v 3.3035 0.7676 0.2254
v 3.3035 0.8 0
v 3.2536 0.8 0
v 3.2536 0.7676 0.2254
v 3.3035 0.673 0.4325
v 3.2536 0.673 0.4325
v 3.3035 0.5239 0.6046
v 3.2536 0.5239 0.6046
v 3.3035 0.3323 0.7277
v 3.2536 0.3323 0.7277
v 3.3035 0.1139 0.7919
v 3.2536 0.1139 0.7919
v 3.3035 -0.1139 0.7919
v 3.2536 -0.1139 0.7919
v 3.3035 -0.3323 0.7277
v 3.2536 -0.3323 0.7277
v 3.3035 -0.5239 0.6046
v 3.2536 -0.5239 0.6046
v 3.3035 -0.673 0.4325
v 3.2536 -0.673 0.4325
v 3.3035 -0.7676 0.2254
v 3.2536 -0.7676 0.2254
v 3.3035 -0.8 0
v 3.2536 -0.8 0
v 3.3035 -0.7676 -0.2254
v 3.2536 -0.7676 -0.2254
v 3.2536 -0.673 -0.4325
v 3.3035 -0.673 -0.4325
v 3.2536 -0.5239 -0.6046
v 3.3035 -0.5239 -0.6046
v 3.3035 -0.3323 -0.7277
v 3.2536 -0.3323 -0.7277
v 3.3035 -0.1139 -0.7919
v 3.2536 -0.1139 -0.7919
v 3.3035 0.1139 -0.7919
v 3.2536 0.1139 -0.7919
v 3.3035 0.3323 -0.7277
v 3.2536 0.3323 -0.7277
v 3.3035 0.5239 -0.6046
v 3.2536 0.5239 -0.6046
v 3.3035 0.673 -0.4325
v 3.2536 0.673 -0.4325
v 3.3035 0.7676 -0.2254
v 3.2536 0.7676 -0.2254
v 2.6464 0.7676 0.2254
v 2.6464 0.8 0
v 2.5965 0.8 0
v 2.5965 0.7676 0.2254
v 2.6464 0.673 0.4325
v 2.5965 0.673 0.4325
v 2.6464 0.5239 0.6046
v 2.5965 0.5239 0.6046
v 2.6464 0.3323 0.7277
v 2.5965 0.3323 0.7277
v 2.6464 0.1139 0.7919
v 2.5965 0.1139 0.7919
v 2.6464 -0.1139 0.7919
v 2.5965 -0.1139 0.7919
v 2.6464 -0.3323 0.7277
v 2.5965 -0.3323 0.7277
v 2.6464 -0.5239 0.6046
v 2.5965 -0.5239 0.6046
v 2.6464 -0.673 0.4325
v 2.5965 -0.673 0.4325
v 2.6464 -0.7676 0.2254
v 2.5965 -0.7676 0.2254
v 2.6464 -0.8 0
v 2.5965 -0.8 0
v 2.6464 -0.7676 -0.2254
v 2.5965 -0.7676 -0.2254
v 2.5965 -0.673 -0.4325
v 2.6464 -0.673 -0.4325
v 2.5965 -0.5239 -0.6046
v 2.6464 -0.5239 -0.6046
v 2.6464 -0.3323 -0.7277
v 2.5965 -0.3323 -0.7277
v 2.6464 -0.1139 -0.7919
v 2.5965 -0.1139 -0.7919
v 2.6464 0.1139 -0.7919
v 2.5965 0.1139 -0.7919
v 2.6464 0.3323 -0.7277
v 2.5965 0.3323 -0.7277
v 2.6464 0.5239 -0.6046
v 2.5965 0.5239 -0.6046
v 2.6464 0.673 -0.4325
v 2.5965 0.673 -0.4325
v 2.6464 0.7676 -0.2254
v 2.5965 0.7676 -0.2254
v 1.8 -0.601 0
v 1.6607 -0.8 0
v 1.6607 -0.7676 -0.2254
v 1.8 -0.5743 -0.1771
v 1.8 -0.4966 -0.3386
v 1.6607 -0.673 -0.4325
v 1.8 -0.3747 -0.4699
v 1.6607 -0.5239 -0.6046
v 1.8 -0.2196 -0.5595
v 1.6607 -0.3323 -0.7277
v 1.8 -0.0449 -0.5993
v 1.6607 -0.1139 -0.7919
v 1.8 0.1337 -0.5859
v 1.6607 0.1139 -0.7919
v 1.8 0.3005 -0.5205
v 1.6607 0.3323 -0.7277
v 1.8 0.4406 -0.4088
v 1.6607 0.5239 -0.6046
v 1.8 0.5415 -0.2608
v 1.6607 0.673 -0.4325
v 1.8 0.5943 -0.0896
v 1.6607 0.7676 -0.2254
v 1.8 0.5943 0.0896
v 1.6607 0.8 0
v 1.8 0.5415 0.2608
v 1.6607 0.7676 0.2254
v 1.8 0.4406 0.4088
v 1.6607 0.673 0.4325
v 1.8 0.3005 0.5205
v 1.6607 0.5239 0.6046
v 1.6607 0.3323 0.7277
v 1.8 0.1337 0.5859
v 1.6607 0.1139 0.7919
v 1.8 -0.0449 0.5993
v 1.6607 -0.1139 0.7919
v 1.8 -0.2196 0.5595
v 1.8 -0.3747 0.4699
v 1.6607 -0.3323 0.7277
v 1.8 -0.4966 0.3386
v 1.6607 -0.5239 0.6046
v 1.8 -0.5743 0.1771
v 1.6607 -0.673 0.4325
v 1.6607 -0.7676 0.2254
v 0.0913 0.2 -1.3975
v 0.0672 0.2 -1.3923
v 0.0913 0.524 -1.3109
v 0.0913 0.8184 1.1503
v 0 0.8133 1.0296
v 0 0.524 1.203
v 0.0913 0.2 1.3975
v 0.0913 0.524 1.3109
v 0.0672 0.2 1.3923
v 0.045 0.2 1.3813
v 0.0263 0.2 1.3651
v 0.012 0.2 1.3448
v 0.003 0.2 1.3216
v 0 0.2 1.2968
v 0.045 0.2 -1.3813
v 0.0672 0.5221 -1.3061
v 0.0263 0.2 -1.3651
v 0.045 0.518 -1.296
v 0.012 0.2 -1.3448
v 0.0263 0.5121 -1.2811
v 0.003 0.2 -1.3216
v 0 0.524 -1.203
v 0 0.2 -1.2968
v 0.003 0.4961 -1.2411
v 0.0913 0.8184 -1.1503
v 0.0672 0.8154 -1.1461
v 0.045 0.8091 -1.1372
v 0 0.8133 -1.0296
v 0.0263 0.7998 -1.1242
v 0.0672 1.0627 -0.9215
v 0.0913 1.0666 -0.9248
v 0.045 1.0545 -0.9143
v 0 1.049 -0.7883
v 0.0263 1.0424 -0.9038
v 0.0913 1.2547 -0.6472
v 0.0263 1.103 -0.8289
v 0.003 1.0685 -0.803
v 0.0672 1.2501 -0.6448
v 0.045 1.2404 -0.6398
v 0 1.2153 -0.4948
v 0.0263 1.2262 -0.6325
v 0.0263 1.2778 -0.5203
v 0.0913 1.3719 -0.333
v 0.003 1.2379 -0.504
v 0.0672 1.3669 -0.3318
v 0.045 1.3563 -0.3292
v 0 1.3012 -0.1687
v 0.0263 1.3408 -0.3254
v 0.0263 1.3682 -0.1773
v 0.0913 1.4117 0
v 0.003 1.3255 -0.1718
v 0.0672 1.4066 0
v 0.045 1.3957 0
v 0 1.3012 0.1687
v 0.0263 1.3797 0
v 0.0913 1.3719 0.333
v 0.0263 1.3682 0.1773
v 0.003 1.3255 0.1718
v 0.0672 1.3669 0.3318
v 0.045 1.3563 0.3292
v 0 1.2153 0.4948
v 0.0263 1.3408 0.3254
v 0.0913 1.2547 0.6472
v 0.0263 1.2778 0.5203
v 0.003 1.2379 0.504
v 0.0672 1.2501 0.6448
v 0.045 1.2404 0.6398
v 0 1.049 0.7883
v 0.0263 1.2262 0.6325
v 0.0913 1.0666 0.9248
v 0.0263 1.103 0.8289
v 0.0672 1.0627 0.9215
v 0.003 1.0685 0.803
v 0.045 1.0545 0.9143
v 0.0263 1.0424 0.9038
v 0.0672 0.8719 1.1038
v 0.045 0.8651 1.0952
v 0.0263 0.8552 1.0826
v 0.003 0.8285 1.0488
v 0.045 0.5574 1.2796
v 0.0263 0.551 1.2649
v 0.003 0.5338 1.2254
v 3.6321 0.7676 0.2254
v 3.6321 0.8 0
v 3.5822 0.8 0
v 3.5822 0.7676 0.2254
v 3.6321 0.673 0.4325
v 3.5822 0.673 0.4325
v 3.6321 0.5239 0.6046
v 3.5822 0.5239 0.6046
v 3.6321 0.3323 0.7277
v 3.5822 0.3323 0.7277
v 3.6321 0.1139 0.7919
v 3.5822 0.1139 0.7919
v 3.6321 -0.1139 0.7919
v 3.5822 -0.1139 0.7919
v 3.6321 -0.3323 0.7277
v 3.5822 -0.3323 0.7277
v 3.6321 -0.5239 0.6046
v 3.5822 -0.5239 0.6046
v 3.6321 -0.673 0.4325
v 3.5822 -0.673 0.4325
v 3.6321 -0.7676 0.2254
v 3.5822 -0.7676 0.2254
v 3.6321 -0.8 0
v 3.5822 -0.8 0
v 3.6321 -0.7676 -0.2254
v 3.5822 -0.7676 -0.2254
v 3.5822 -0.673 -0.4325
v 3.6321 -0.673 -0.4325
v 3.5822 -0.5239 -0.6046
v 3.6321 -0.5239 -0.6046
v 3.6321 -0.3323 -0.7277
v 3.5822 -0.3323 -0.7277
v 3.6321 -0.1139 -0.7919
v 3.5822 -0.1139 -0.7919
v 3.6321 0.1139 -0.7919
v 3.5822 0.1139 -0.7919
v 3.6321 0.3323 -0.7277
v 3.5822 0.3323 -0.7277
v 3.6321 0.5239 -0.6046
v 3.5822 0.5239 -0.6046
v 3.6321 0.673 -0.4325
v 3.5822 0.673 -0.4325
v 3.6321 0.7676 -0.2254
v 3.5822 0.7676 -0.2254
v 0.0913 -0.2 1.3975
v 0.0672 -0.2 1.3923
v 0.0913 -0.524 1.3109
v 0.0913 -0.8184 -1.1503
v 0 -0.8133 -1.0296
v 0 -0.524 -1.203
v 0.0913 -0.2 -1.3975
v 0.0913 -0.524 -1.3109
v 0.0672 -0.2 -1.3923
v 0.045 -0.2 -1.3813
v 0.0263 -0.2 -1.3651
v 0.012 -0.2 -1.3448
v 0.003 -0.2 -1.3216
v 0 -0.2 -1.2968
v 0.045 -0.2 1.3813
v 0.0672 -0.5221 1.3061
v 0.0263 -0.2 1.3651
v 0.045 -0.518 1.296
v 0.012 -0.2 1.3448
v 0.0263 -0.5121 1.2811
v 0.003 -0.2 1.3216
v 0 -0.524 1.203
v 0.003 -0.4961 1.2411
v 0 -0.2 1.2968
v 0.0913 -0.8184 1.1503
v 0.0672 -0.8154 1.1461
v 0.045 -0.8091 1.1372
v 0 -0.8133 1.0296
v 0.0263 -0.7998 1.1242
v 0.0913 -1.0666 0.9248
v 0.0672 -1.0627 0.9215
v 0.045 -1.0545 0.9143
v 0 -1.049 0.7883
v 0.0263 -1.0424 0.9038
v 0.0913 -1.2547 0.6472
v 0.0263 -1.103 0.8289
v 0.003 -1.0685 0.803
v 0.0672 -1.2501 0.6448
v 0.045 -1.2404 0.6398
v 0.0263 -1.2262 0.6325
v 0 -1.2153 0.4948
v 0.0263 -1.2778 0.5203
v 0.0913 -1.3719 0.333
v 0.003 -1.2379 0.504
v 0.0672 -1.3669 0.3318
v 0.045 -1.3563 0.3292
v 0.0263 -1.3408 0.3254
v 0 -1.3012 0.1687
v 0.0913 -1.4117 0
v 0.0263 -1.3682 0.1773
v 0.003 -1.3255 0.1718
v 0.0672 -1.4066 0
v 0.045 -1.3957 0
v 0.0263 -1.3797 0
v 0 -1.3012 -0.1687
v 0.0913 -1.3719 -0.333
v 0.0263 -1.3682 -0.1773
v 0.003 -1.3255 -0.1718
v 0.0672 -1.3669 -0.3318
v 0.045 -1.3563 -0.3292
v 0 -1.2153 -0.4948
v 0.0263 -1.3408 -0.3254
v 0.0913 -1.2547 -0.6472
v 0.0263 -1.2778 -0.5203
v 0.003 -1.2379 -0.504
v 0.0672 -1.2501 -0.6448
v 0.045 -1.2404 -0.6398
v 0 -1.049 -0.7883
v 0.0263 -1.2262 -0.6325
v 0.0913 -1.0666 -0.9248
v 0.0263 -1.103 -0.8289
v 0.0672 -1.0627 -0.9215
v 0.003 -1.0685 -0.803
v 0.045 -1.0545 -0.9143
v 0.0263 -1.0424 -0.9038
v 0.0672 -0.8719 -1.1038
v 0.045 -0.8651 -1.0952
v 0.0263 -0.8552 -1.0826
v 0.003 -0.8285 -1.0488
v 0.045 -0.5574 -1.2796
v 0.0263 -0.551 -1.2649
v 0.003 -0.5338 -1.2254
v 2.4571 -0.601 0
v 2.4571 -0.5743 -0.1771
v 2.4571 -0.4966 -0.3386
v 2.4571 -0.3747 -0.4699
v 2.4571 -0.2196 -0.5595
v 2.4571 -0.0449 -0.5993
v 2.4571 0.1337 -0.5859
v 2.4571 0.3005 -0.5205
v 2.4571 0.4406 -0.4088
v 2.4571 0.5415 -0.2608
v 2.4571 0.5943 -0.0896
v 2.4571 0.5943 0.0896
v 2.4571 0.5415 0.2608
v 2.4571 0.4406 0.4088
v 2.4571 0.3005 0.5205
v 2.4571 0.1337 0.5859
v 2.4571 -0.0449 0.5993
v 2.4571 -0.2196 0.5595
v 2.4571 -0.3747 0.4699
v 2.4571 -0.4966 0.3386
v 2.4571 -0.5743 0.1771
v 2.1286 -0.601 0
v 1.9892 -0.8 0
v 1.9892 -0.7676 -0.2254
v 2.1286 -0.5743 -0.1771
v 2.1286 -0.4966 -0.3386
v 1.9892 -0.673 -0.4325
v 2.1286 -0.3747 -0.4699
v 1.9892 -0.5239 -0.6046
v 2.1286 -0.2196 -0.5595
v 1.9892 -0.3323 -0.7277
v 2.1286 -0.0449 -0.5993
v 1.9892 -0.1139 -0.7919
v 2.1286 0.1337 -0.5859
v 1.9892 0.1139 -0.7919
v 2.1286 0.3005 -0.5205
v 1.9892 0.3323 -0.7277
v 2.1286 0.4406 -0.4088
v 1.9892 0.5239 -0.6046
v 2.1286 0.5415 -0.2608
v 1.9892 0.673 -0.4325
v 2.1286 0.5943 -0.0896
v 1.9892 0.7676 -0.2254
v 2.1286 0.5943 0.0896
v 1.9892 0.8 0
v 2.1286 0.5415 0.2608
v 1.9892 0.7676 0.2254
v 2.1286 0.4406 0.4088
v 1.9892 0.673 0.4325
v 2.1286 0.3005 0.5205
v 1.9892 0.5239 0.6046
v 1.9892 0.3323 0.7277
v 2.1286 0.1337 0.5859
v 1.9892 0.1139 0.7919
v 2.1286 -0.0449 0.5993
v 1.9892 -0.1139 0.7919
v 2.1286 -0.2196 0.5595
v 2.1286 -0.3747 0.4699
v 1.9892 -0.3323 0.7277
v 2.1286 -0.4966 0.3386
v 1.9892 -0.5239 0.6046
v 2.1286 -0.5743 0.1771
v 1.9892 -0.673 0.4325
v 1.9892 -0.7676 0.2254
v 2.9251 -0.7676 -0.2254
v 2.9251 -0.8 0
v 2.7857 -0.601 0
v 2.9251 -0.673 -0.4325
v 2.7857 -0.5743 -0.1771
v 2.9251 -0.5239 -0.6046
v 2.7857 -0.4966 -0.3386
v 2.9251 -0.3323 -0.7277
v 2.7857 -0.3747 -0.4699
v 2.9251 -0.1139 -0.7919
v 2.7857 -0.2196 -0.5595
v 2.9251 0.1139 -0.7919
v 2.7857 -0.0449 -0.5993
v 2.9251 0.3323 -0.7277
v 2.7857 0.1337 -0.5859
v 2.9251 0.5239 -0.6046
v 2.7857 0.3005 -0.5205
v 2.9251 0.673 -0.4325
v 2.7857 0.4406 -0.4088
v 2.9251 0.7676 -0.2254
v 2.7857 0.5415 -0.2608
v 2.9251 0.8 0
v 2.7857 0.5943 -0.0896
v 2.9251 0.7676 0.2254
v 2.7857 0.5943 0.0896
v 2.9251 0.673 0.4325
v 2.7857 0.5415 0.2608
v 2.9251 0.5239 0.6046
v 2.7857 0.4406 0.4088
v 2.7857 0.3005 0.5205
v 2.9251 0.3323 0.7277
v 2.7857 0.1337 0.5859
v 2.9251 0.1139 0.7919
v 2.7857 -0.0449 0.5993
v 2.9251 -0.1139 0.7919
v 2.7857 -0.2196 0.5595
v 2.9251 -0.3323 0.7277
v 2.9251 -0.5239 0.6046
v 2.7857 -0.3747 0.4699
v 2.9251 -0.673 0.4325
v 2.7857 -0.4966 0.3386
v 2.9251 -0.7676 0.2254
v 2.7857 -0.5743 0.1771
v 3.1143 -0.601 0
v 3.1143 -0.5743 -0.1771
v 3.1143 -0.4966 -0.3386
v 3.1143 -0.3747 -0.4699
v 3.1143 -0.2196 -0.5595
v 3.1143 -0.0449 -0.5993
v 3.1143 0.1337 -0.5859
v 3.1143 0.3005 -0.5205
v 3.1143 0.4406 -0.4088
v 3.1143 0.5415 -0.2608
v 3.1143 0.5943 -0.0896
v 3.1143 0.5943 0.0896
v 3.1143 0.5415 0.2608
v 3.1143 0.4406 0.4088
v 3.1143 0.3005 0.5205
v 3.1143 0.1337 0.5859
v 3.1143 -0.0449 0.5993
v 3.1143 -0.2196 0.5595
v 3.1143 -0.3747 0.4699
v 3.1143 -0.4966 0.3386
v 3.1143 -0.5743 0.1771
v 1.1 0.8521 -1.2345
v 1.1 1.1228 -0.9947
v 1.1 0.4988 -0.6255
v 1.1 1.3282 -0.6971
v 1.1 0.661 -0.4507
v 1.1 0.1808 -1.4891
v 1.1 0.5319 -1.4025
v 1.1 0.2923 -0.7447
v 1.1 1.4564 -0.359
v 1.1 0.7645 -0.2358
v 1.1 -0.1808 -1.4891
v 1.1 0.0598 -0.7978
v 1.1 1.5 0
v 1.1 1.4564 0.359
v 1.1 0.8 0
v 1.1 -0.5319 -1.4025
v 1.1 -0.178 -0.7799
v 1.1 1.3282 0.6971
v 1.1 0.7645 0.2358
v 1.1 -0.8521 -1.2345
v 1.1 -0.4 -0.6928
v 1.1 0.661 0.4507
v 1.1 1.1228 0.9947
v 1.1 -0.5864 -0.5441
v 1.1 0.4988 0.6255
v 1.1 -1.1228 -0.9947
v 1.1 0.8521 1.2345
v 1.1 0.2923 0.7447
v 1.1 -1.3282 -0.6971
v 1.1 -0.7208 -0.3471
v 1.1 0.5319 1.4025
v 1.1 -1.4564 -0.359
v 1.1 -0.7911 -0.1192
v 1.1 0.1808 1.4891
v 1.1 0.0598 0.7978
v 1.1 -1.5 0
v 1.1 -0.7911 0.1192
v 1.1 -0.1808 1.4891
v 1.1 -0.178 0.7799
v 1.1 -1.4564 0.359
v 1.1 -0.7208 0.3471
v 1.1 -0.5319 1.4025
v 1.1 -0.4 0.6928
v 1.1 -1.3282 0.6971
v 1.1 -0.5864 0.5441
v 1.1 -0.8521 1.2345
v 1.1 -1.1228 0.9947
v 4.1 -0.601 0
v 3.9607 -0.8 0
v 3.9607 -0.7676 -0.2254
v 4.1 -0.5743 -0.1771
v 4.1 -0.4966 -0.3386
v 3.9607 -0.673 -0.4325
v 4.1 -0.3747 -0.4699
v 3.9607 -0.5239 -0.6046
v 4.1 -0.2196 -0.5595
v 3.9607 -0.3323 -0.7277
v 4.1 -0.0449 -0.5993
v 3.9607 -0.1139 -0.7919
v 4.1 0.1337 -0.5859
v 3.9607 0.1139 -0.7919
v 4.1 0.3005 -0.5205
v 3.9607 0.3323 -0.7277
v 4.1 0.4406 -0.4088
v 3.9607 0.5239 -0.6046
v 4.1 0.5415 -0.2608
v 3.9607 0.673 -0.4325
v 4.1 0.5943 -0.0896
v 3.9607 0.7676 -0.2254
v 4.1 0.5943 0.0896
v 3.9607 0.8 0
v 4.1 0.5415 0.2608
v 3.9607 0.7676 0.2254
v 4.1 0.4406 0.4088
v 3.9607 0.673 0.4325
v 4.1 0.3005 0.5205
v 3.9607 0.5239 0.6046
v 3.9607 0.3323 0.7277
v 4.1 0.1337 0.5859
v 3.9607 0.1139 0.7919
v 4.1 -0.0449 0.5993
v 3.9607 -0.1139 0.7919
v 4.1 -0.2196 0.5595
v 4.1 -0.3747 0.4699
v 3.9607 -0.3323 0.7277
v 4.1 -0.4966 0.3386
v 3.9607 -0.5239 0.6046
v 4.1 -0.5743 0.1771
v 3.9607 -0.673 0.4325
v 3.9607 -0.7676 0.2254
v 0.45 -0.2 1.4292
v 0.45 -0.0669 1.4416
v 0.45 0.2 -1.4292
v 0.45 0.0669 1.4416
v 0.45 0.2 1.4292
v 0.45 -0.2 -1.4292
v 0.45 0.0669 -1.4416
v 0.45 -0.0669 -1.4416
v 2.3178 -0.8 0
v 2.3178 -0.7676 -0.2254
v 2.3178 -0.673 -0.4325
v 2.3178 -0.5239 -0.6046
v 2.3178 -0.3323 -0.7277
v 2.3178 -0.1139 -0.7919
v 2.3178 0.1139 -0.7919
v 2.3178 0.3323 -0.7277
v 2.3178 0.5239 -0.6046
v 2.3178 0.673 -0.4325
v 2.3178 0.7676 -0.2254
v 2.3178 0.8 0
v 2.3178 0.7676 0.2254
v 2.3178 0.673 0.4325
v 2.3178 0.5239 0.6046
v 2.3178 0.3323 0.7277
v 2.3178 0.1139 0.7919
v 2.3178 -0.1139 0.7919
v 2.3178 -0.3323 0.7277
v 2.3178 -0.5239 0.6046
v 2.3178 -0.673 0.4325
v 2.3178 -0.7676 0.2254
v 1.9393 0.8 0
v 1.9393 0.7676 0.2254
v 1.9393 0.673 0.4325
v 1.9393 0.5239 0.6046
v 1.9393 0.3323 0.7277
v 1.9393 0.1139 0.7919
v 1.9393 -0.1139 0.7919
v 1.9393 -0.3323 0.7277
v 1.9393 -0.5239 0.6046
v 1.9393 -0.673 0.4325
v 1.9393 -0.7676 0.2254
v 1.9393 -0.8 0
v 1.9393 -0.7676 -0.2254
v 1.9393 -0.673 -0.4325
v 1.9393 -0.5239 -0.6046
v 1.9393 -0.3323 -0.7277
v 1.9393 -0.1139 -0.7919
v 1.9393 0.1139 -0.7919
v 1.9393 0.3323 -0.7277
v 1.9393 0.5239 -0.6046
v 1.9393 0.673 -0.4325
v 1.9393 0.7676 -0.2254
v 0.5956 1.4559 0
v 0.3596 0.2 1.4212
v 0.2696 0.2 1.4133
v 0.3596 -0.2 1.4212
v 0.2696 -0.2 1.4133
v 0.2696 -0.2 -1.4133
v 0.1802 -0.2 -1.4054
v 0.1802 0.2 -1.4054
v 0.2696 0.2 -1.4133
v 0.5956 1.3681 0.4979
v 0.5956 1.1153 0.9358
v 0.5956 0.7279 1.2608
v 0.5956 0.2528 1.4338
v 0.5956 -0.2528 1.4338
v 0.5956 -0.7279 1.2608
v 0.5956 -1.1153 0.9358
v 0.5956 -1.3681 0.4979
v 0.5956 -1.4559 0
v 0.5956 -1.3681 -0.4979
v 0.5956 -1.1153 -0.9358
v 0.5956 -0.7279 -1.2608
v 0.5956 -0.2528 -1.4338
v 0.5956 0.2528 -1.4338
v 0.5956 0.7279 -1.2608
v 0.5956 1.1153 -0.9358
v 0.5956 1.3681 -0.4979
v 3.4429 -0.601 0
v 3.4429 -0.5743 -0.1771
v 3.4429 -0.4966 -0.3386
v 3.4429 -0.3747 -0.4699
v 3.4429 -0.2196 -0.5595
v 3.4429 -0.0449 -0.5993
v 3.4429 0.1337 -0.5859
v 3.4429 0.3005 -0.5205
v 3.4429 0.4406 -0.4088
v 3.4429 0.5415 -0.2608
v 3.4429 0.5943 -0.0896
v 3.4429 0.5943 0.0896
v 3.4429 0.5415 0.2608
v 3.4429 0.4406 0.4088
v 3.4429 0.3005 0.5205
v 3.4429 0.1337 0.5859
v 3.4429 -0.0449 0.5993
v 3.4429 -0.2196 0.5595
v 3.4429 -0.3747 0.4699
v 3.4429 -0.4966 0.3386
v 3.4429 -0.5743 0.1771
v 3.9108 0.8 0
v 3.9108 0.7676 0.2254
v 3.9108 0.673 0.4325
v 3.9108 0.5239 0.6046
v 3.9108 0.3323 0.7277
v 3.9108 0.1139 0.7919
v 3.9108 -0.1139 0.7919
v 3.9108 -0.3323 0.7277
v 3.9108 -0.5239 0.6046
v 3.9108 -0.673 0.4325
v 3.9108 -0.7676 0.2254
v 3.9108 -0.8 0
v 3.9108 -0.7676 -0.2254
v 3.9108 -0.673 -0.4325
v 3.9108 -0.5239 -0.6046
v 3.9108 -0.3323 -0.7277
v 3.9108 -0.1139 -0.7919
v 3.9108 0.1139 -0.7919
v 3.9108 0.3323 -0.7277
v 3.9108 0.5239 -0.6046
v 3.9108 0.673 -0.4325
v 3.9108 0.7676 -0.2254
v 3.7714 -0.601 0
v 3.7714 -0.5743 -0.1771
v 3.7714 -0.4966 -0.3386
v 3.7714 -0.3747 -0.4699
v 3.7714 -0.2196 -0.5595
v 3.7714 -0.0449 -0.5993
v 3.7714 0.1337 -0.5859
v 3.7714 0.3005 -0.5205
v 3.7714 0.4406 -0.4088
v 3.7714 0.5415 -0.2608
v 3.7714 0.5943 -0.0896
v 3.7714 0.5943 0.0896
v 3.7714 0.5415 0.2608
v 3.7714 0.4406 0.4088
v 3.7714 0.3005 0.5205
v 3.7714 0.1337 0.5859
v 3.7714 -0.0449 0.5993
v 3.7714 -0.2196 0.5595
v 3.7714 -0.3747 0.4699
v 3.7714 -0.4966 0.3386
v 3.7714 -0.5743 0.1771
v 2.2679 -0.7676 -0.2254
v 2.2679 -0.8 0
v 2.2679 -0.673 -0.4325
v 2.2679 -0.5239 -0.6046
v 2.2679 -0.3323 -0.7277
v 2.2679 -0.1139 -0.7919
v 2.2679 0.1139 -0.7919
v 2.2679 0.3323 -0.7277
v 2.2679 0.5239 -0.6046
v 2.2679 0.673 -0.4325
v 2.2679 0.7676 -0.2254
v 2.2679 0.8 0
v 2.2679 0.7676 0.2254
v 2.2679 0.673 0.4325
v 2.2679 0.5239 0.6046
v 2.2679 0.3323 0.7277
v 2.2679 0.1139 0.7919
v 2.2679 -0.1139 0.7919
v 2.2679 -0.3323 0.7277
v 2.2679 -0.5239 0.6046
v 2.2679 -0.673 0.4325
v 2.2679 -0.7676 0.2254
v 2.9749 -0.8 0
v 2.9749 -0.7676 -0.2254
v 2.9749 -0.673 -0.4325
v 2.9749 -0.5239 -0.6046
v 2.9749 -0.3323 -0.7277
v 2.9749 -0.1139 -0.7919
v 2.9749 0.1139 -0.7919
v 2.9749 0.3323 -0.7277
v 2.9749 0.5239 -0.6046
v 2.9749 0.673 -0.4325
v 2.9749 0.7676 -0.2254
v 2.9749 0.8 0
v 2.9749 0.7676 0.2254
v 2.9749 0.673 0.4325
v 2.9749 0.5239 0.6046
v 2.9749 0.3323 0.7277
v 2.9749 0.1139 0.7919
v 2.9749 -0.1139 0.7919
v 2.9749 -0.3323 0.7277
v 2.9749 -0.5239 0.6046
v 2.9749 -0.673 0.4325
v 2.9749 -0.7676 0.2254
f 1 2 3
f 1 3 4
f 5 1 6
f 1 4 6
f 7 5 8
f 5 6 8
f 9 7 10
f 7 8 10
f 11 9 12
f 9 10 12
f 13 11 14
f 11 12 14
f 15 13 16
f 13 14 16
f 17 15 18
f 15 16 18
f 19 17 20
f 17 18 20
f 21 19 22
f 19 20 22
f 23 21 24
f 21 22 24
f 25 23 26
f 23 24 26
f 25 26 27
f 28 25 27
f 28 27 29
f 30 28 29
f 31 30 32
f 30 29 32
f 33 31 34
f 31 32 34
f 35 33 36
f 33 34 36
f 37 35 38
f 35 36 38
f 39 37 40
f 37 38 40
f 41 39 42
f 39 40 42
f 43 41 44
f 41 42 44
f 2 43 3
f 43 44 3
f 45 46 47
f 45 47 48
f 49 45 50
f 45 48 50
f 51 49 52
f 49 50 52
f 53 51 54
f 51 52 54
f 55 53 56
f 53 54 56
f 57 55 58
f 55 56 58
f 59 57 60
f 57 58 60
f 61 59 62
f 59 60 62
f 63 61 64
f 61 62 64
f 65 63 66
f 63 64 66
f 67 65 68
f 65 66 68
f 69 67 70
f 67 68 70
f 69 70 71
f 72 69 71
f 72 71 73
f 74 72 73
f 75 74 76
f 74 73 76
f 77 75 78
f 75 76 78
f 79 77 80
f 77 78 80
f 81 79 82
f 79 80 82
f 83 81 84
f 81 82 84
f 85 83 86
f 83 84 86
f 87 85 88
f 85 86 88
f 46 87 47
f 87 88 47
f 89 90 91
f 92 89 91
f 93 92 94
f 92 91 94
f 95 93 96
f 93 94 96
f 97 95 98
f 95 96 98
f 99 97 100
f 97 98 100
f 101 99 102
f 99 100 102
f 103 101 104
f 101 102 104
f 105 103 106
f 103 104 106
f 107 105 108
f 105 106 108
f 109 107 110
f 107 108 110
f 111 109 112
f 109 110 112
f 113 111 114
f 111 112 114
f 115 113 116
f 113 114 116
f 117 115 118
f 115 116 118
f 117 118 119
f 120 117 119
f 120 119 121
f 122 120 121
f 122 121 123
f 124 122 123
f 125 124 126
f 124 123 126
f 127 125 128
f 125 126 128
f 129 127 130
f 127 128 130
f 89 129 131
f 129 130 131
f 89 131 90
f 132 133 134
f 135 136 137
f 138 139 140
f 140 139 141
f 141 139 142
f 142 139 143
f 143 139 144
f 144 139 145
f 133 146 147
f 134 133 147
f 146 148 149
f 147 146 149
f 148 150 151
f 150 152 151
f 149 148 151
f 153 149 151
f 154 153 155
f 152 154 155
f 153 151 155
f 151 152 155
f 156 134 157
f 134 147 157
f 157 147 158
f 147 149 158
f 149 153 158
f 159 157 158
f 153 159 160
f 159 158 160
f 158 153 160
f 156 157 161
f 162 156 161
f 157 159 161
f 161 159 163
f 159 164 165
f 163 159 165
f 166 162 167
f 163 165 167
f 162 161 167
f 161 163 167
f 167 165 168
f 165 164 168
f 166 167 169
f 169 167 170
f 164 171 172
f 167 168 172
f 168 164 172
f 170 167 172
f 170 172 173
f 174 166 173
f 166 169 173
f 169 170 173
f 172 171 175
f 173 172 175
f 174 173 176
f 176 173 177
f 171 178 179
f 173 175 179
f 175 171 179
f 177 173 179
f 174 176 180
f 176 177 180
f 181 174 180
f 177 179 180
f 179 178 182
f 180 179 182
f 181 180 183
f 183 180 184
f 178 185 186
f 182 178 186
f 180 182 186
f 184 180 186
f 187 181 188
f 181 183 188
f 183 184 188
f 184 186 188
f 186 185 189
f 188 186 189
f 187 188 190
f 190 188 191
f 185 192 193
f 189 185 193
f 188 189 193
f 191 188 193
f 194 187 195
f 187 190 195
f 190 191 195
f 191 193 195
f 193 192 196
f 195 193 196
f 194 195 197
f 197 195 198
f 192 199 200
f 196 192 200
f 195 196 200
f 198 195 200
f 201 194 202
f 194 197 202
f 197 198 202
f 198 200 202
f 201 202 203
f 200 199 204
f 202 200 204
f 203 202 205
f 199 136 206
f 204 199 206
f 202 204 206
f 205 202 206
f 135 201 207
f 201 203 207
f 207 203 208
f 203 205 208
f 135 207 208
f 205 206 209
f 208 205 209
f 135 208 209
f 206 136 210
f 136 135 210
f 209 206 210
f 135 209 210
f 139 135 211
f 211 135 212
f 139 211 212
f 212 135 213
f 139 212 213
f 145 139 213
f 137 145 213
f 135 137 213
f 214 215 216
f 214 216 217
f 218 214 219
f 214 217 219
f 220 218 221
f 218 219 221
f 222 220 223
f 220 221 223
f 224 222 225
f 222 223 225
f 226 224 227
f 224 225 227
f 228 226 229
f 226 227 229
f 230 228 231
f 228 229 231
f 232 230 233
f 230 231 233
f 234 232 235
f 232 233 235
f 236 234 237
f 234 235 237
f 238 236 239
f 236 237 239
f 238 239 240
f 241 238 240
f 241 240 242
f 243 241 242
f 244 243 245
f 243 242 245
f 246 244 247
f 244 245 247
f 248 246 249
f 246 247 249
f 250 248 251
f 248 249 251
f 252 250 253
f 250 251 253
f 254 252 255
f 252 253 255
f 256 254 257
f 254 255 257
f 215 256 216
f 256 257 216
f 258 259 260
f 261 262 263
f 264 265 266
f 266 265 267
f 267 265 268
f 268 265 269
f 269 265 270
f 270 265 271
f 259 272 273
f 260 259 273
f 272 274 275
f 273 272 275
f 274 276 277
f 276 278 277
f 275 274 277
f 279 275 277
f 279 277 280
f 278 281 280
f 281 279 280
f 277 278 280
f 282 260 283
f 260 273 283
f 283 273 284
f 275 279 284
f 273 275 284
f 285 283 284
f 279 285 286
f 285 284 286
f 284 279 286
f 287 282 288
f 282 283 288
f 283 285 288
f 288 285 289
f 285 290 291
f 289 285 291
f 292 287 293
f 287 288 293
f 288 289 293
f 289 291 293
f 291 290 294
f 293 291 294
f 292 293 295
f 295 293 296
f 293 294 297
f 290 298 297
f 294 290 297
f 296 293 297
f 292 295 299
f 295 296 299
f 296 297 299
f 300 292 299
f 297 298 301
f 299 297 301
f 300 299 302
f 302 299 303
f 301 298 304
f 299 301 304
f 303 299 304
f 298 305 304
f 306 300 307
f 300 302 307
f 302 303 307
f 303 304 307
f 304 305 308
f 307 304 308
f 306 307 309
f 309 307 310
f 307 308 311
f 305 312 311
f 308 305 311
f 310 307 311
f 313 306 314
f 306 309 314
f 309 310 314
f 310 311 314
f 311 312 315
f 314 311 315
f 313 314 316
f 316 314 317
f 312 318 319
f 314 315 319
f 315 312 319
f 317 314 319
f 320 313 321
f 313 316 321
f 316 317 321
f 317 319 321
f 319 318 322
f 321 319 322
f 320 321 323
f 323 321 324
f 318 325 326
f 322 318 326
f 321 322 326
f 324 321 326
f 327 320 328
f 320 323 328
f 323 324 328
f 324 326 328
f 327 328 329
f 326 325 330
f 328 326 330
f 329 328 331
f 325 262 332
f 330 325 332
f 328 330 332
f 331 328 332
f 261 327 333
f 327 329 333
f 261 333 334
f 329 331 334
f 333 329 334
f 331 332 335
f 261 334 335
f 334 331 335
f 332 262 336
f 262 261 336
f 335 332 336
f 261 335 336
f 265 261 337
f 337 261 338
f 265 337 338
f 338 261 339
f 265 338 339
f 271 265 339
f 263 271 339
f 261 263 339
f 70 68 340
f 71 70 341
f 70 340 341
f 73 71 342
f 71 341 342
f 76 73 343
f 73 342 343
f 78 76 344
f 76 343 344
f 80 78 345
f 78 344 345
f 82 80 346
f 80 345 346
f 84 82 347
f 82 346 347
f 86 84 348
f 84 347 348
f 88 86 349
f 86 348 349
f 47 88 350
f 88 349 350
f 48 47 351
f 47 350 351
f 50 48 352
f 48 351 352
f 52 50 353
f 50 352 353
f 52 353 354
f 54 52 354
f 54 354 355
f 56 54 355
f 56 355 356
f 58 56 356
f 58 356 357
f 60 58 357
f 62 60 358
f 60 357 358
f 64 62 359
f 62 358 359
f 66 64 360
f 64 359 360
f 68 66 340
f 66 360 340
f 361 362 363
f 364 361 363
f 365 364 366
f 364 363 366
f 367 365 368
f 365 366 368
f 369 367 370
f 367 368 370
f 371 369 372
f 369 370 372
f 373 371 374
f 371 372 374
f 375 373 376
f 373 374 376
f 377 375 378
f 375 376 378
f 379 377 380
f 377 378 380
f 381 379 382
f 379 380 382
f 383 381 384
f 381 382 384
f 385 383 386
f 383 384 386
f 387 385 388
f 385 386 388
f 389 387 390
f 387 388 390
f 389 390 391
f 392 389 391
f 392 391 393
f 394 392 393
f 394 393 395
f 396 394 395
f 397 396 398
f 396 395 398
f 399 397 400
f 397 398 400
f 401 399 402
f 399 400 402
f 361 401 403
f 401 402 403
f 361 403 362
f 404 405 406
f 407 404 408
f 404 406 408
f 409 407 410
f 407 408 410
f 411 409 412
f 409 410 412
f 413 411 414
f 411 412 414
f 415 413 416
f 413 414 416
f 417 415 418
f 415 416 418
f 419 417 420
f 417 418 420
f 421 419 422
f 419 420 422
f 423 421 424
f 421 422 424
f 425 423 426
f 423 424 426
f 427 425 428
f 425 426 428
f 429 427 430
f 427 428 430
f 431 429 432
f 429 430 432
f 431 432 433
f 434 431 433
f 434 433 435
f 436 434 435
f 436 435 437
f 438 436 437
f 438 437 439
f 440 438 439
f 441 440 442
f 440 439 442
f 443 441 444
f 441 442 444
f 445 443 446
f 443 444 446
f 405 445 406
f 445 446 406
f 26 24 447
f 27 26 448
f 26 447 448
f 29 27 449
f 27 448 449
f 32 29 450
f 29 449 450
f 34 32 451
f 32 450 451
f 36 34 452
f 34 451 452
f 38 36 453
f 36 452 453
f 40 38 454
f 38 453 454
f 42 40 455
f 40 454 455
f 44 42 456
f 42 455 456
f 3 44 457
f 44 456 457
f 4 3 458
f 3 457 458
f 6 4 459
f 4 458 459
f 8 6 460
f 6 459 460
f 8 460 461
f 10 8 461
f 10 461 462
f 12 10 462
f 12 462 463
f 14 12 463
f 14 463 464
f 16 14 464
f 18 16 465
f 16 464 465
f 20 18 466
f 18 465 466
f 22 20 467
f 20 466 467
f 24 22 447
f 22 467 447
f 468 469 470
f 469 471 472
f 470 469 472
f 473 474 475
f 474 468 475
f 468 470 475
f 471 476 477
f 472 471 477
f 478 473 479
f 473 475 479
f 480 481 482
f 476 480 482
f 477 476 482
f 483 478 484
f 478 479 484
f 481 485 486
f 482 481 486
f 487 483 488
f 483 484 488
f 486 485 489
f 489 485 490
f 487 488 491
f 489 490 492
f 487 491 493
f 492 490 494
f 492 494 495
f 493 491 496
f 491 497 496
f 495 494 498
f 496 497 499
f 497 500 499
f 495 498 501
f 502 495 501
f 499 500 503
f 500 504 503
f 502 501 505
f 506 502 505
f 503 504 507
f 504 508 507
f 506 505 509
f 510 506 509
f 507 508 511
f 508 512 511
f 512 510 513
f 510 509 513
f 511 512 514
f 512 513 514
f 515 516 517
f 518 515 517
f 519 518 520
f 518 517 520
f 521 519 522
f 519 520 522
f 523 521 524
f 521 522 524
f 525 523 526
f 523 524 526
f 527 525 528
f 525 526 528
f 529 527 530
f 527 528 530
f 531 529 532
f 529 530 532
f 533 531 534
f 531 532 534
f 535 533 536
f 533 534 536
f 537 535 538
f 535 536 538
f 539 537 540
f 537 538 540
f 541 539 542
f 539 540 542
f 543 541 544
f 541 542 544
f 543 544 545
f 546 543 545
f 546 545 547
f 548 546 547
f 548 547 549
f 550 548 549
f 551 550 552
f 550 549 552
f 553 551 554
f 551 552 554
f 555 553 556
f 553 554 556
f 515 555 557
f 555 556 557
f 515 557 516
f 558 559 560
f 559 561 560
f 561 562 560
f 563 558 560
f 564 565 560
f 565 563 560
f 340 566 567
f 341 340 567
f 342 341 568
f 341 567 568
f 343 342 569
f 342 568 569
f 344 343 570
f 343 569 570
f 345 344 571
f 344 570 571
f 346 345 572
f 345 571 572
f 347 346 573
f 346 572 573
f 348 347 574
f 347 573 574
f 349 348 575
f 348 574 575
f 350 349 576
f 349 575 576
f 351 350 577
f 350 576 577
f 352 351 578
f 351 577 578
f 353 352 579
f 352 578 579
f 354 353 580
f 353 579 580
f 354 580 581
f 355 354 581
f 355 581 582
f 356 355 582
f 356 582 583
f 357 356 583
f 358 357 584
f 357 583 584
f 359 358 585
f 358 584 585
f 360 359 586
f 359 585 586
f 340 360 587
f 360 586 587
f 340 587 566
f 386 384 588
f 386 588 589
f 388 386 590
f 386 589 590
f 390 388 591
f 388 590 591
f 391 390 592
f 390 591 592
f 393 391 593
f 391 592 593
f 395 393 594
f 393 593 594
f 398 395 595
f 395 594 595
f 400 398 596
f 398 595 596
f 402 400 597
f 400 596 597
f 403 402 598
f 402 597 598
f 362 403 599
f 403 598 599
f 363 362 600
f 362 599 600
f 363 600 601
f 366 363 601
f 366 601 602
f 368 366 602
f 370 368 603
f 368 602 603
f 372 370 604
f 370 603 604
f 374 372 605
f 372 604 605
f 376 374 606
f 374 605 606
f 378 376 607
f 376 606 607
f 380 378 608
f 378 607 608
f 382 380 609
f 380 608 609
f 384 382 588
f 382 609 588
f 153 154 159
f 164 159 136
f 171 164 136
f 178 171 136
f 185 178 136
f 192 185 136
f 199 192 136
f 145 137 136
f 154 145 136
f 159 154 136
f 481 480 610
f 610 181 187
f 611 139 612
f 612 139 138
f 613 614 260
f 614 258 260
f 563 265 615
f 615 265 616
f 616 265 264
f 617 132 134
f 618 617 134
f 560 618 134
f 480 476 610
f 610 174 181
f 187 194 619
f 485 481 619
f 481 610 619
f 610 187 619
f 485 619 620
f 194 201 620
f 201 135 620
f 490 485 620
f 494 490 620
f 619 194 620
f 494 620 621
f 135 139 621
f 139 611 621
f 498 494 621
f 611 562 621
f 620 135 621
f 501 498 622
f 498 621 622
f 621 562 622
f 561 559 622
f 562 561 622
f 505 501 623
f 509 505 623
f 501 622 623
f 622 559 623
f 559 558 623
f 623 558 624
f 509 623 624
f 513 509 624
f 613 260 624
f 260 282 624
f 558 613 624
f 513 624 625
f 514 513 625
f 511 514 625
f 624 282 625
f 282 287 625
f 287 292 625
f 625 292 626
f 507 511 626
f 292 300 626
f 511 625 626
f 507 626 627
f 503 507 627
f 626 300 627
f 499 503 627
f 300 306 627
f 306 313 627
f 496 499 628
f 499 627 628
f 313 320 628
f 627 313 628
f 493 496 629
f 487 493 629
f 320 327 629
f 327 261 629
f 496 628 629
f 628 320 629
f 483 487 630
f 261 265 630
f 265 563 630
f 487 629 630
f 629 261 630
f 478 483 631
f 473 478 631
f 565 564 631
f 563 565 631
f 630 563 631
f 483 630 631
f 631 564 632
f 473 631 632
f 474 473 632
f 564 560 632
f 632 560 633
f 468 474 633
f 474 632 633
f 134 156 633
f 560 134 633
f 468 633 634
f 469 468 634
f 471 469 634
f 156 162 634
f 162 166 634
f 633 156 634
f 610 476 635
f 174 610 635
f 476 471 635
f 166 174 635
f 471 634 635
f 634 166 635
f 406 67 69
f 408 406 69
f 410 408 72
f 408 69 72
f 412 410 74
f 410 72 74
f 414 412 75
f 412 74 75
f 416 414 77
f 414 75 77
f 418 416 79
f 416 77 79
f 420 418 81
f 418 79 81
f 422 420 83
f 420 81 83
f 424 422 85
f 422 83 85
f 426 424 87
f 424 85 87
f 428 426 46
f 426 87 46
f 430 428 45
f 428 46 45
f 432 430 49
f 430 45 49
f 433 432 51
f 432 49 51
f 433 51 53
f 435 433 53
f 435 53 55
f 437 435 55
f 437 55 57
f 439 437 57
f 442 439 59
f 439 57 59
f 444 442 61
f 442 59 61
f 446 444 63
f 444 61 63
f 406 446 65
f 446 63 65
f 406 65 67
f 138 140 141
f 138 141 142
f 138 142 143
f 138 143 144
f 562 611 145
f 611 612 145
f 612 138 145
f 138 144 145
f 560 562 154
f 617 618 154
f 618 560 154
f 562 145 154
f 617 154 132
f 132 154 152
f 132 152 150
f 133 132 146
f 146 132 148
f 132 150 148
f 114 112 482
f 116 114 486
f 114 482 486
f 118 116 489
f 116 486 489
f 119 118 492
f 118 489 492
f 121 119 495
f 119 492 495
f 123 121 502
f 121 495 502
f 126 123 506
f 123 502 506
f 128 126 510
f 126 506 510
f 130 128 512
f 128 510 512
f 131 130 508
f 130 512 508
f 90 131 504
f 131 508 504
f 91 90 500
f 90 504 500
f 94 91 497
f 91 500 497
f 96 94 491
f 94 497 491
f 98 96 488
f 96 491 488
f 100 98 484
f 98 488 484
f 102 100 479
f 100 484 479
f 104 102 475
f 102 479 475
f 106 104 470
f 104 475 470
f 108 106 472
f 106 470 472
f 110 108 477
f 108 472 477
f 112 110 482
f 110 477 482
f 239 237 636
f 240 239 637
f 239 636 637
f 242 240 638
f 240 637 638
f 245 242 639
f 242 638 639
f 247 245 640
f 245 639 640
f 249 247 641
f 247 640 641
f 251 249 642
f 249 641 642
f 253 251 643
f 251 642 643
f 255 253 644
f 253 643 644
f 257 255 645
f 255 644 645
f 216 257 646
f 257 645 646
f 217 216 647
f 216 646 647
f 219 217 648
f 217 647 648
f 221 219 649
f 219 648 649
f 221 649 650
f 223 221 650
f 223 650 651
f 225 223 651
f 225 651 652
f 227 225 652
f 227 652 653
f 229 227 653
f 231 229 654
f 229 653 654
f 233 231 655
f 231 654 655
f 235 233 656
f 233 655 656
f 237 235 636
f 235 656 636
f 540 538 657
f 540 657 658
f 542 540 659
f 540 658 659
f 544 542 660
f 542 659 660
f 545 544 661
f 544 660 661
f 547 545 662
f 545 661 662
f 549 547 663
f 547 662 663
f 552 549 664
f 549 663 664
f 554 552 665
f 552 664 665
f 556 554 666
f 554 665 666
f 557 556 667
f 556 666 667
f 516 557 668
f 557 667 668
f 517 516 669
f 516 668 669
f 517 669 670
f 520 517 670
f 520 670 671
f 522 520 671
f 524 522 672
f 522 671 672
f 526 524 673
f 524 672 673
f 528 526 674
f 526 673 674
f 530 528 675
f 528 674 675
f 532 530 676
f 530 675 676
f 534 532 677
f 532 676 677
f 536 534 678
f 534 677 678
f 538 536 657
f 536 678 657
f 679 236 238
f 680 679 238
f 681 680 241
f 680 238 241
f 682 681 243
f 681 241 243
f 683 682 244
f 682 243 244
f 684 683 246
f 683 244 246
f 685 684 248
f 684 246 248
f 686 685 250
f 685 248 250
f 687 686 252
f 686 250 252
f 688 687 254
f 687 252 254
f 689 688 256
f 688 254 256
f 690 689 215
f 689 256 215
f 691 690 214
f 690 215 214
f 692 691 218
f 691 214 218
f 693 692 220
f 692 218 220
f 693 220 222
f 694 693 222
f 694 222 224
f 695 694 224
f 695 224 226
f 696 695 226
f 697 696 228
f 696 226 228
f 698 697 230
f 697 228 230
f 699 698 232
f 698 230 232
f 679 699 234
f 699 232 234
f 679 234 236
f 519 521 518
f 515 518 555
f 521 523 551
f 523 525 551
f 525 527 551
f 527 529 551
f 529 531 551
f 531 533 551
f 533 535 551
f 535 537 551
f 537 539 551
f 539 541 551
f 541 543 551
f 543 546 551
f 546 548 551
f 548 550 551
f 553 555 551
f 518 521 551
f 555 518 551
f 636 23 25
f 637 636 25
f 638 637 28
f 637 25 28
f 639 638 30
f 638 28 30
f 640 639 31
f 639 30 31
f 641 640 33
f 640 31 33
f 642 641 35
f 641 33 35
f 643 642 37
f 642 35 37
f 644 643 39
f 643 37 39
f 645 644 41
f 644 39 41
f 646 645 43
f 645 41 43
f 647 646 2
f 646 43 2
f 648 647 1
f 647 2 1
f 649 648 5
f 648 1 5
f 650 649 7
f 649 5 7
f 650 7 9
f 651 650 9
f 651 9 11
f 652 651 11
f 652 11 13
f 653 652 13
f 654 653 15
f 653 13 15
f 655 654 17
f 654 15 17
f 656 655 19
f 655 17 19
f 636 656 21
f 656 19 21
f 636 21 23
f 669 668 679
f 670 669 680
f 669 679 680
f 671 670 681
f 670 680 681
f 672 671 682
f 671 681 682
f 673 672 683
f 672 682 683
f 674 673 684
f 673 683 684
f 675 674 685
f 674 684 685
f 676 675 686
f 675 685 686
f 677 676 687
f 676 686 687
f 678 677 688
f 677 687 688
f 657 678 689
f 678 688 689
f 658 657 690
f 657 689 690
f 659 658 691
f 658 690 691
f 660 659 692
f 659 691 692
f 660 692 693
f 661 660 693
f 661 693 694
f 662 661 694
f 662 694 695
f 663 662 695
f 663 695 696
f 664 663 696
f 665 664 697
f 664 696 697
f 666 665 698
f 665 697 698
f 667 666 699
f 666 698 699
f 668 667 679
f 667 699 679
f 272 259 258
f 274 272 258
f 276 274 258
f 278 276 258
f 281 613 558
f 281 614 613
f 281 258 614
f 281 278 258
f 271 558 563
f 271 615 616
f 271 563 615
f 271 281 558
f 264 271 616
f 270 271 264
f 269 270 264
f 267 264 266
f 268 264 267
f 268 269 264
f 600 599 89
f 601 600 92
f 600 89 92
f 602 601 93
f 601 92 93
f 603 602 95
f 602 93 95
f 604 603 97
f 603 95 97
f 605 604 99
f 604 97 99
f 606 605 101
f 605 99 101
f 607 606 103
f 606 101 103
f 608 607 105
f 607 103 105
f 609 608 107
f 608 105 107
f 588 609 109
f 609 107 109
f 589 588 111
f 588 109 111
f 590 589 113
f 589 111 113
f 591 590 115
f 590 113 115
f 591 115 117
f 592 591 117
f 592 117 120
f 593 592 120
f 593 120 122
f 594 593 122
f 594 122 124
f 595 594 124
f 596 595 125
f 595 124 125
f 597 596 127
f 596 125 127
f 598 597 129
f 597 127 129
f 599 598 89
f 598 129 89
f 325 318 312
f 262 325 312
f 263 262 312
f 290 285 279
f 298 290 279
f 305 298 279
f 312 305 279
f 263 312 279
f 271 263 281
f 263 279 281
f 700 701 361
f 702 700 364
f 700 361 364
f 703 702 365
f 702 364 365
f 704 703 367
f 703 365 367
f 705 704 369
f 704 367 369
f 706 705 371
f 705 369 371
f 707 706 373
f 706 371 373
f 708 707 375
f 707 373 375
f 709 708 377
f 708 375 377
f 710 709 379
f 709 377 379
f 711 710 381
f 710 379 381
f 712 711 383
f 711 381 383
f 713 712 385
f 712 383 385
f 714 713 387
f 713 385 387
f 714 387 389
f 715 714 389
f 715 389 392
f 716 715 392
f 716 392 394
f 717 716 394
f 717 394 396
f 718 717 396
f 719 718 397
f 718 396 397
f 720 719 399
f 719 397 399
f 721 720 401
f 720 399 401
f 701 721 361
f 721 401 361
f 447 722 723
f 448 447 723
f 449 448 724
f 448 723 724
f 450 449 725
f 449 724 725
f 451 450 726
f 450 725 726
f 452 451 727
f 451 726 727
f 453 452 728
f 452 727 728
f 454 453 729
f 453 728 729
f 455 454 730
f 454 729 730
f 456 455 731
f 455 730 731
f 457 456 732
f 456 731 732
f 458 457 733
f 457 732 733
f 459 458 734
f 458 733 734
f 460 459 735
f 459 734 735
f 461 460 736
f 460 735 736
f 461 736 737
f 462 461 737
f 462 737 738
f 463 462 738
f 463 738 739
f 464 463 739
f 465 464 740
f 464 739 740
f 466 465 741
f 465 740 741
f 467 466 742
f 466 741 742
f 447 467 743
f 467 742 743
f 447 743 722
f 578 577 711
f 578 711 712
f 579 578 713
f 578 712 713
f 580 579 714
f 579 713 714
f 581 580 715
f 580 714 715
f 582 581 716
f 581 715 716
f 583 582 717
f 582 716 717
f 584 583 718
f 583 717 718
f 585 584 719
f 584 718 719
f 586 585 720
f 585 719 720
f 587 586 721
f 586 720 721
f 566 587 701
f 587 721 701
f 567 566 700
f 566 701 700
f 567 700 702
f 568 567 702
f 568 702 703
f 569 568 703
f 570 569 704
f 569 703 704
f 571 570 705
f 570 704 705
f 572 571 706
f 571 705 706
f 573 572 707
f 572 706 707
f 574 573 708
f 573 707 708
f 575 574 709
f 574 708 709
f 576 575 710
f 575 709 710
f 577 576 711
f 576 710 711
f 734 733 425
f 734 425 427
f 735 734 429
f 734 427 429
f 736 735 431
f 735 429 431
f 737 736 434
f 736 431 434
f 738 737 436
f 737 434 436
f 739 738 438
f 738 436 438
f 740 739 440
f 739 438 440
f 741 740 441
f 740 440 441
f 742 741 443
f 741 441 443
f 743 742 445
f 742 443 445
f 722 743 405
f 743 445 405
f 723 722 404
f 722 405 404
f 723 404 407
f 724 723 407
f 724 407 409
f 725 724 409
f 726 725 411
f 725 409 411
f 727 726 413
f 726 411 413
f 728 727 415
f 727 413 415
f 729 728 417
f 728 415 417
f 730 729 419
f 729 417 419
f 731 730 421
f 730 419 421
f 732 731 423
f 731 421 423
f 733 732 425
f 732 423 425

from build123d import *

# Parameters (mm, degrees)
FILLET2_R       = 0.1
SKETCH2_W       = 3
SKETCH2_H       = 0.4
SLOT_DEPTH      = 0.45
THDSCHPAT_COUNT = 8
THDSCHPAT_PITCH = 0.328571429


with BuildPart() as part:
    # BodySke → Base-Revolve (revolve)
    with BuildSketch(Plane.XY):
        Polygon((1.1, 0.8), (1.1, 1.5), (0, 1.40376247), (0, 0), (4.1, 0), (4.1, 0.8), align=None)
    revolve(axis=Axis((-25.4, 0, 0), (1, 0, 0)))

    # Fillet2
    fillet2_edges = [part.edges().sort_by_distance(p)[0] for p in [
        (0, -1.40376247, 0),
    ]]
    fillet(fillet2_edges, radius=FILLET2_R)

    # Sketch2 → Slot (cut)
    with BuildSketch(Plane(origin=(0, 0, 0), x_dir=(0, 0, -1), z_dir=(1, 0, 0))):
        Rectangle(SKETCH2_W, SKETCH2_H)
    extrude(amount=SLOT_DEPTH, mode=Mode.SUBTRACT)

    # ThdSchSke → ThreadSchematic (revolve, cut)
    with BuildSketch(Plane.XY):
        Polygon((1.8, -0.601), (1.6606587, -0.8), (1.6606587, -1), (1.9393413, -1), (1.9393413, -0.8), align=None)
    threadschematic = revolve(axis=Axis((-3.175, 0, 0), (1, 0, 0)), mode=Mode.SUBTRACT)

    # ThdSchPat: ThreadSchematic ×8
    with Locations(*[(i * THDSCHPAT_PITCH, 0, 0) for i in range(1, THDSCHPAT_COUNT)]):
        add(threadschematic, mode=Mode.SUBTRACT)


solid = part.part
